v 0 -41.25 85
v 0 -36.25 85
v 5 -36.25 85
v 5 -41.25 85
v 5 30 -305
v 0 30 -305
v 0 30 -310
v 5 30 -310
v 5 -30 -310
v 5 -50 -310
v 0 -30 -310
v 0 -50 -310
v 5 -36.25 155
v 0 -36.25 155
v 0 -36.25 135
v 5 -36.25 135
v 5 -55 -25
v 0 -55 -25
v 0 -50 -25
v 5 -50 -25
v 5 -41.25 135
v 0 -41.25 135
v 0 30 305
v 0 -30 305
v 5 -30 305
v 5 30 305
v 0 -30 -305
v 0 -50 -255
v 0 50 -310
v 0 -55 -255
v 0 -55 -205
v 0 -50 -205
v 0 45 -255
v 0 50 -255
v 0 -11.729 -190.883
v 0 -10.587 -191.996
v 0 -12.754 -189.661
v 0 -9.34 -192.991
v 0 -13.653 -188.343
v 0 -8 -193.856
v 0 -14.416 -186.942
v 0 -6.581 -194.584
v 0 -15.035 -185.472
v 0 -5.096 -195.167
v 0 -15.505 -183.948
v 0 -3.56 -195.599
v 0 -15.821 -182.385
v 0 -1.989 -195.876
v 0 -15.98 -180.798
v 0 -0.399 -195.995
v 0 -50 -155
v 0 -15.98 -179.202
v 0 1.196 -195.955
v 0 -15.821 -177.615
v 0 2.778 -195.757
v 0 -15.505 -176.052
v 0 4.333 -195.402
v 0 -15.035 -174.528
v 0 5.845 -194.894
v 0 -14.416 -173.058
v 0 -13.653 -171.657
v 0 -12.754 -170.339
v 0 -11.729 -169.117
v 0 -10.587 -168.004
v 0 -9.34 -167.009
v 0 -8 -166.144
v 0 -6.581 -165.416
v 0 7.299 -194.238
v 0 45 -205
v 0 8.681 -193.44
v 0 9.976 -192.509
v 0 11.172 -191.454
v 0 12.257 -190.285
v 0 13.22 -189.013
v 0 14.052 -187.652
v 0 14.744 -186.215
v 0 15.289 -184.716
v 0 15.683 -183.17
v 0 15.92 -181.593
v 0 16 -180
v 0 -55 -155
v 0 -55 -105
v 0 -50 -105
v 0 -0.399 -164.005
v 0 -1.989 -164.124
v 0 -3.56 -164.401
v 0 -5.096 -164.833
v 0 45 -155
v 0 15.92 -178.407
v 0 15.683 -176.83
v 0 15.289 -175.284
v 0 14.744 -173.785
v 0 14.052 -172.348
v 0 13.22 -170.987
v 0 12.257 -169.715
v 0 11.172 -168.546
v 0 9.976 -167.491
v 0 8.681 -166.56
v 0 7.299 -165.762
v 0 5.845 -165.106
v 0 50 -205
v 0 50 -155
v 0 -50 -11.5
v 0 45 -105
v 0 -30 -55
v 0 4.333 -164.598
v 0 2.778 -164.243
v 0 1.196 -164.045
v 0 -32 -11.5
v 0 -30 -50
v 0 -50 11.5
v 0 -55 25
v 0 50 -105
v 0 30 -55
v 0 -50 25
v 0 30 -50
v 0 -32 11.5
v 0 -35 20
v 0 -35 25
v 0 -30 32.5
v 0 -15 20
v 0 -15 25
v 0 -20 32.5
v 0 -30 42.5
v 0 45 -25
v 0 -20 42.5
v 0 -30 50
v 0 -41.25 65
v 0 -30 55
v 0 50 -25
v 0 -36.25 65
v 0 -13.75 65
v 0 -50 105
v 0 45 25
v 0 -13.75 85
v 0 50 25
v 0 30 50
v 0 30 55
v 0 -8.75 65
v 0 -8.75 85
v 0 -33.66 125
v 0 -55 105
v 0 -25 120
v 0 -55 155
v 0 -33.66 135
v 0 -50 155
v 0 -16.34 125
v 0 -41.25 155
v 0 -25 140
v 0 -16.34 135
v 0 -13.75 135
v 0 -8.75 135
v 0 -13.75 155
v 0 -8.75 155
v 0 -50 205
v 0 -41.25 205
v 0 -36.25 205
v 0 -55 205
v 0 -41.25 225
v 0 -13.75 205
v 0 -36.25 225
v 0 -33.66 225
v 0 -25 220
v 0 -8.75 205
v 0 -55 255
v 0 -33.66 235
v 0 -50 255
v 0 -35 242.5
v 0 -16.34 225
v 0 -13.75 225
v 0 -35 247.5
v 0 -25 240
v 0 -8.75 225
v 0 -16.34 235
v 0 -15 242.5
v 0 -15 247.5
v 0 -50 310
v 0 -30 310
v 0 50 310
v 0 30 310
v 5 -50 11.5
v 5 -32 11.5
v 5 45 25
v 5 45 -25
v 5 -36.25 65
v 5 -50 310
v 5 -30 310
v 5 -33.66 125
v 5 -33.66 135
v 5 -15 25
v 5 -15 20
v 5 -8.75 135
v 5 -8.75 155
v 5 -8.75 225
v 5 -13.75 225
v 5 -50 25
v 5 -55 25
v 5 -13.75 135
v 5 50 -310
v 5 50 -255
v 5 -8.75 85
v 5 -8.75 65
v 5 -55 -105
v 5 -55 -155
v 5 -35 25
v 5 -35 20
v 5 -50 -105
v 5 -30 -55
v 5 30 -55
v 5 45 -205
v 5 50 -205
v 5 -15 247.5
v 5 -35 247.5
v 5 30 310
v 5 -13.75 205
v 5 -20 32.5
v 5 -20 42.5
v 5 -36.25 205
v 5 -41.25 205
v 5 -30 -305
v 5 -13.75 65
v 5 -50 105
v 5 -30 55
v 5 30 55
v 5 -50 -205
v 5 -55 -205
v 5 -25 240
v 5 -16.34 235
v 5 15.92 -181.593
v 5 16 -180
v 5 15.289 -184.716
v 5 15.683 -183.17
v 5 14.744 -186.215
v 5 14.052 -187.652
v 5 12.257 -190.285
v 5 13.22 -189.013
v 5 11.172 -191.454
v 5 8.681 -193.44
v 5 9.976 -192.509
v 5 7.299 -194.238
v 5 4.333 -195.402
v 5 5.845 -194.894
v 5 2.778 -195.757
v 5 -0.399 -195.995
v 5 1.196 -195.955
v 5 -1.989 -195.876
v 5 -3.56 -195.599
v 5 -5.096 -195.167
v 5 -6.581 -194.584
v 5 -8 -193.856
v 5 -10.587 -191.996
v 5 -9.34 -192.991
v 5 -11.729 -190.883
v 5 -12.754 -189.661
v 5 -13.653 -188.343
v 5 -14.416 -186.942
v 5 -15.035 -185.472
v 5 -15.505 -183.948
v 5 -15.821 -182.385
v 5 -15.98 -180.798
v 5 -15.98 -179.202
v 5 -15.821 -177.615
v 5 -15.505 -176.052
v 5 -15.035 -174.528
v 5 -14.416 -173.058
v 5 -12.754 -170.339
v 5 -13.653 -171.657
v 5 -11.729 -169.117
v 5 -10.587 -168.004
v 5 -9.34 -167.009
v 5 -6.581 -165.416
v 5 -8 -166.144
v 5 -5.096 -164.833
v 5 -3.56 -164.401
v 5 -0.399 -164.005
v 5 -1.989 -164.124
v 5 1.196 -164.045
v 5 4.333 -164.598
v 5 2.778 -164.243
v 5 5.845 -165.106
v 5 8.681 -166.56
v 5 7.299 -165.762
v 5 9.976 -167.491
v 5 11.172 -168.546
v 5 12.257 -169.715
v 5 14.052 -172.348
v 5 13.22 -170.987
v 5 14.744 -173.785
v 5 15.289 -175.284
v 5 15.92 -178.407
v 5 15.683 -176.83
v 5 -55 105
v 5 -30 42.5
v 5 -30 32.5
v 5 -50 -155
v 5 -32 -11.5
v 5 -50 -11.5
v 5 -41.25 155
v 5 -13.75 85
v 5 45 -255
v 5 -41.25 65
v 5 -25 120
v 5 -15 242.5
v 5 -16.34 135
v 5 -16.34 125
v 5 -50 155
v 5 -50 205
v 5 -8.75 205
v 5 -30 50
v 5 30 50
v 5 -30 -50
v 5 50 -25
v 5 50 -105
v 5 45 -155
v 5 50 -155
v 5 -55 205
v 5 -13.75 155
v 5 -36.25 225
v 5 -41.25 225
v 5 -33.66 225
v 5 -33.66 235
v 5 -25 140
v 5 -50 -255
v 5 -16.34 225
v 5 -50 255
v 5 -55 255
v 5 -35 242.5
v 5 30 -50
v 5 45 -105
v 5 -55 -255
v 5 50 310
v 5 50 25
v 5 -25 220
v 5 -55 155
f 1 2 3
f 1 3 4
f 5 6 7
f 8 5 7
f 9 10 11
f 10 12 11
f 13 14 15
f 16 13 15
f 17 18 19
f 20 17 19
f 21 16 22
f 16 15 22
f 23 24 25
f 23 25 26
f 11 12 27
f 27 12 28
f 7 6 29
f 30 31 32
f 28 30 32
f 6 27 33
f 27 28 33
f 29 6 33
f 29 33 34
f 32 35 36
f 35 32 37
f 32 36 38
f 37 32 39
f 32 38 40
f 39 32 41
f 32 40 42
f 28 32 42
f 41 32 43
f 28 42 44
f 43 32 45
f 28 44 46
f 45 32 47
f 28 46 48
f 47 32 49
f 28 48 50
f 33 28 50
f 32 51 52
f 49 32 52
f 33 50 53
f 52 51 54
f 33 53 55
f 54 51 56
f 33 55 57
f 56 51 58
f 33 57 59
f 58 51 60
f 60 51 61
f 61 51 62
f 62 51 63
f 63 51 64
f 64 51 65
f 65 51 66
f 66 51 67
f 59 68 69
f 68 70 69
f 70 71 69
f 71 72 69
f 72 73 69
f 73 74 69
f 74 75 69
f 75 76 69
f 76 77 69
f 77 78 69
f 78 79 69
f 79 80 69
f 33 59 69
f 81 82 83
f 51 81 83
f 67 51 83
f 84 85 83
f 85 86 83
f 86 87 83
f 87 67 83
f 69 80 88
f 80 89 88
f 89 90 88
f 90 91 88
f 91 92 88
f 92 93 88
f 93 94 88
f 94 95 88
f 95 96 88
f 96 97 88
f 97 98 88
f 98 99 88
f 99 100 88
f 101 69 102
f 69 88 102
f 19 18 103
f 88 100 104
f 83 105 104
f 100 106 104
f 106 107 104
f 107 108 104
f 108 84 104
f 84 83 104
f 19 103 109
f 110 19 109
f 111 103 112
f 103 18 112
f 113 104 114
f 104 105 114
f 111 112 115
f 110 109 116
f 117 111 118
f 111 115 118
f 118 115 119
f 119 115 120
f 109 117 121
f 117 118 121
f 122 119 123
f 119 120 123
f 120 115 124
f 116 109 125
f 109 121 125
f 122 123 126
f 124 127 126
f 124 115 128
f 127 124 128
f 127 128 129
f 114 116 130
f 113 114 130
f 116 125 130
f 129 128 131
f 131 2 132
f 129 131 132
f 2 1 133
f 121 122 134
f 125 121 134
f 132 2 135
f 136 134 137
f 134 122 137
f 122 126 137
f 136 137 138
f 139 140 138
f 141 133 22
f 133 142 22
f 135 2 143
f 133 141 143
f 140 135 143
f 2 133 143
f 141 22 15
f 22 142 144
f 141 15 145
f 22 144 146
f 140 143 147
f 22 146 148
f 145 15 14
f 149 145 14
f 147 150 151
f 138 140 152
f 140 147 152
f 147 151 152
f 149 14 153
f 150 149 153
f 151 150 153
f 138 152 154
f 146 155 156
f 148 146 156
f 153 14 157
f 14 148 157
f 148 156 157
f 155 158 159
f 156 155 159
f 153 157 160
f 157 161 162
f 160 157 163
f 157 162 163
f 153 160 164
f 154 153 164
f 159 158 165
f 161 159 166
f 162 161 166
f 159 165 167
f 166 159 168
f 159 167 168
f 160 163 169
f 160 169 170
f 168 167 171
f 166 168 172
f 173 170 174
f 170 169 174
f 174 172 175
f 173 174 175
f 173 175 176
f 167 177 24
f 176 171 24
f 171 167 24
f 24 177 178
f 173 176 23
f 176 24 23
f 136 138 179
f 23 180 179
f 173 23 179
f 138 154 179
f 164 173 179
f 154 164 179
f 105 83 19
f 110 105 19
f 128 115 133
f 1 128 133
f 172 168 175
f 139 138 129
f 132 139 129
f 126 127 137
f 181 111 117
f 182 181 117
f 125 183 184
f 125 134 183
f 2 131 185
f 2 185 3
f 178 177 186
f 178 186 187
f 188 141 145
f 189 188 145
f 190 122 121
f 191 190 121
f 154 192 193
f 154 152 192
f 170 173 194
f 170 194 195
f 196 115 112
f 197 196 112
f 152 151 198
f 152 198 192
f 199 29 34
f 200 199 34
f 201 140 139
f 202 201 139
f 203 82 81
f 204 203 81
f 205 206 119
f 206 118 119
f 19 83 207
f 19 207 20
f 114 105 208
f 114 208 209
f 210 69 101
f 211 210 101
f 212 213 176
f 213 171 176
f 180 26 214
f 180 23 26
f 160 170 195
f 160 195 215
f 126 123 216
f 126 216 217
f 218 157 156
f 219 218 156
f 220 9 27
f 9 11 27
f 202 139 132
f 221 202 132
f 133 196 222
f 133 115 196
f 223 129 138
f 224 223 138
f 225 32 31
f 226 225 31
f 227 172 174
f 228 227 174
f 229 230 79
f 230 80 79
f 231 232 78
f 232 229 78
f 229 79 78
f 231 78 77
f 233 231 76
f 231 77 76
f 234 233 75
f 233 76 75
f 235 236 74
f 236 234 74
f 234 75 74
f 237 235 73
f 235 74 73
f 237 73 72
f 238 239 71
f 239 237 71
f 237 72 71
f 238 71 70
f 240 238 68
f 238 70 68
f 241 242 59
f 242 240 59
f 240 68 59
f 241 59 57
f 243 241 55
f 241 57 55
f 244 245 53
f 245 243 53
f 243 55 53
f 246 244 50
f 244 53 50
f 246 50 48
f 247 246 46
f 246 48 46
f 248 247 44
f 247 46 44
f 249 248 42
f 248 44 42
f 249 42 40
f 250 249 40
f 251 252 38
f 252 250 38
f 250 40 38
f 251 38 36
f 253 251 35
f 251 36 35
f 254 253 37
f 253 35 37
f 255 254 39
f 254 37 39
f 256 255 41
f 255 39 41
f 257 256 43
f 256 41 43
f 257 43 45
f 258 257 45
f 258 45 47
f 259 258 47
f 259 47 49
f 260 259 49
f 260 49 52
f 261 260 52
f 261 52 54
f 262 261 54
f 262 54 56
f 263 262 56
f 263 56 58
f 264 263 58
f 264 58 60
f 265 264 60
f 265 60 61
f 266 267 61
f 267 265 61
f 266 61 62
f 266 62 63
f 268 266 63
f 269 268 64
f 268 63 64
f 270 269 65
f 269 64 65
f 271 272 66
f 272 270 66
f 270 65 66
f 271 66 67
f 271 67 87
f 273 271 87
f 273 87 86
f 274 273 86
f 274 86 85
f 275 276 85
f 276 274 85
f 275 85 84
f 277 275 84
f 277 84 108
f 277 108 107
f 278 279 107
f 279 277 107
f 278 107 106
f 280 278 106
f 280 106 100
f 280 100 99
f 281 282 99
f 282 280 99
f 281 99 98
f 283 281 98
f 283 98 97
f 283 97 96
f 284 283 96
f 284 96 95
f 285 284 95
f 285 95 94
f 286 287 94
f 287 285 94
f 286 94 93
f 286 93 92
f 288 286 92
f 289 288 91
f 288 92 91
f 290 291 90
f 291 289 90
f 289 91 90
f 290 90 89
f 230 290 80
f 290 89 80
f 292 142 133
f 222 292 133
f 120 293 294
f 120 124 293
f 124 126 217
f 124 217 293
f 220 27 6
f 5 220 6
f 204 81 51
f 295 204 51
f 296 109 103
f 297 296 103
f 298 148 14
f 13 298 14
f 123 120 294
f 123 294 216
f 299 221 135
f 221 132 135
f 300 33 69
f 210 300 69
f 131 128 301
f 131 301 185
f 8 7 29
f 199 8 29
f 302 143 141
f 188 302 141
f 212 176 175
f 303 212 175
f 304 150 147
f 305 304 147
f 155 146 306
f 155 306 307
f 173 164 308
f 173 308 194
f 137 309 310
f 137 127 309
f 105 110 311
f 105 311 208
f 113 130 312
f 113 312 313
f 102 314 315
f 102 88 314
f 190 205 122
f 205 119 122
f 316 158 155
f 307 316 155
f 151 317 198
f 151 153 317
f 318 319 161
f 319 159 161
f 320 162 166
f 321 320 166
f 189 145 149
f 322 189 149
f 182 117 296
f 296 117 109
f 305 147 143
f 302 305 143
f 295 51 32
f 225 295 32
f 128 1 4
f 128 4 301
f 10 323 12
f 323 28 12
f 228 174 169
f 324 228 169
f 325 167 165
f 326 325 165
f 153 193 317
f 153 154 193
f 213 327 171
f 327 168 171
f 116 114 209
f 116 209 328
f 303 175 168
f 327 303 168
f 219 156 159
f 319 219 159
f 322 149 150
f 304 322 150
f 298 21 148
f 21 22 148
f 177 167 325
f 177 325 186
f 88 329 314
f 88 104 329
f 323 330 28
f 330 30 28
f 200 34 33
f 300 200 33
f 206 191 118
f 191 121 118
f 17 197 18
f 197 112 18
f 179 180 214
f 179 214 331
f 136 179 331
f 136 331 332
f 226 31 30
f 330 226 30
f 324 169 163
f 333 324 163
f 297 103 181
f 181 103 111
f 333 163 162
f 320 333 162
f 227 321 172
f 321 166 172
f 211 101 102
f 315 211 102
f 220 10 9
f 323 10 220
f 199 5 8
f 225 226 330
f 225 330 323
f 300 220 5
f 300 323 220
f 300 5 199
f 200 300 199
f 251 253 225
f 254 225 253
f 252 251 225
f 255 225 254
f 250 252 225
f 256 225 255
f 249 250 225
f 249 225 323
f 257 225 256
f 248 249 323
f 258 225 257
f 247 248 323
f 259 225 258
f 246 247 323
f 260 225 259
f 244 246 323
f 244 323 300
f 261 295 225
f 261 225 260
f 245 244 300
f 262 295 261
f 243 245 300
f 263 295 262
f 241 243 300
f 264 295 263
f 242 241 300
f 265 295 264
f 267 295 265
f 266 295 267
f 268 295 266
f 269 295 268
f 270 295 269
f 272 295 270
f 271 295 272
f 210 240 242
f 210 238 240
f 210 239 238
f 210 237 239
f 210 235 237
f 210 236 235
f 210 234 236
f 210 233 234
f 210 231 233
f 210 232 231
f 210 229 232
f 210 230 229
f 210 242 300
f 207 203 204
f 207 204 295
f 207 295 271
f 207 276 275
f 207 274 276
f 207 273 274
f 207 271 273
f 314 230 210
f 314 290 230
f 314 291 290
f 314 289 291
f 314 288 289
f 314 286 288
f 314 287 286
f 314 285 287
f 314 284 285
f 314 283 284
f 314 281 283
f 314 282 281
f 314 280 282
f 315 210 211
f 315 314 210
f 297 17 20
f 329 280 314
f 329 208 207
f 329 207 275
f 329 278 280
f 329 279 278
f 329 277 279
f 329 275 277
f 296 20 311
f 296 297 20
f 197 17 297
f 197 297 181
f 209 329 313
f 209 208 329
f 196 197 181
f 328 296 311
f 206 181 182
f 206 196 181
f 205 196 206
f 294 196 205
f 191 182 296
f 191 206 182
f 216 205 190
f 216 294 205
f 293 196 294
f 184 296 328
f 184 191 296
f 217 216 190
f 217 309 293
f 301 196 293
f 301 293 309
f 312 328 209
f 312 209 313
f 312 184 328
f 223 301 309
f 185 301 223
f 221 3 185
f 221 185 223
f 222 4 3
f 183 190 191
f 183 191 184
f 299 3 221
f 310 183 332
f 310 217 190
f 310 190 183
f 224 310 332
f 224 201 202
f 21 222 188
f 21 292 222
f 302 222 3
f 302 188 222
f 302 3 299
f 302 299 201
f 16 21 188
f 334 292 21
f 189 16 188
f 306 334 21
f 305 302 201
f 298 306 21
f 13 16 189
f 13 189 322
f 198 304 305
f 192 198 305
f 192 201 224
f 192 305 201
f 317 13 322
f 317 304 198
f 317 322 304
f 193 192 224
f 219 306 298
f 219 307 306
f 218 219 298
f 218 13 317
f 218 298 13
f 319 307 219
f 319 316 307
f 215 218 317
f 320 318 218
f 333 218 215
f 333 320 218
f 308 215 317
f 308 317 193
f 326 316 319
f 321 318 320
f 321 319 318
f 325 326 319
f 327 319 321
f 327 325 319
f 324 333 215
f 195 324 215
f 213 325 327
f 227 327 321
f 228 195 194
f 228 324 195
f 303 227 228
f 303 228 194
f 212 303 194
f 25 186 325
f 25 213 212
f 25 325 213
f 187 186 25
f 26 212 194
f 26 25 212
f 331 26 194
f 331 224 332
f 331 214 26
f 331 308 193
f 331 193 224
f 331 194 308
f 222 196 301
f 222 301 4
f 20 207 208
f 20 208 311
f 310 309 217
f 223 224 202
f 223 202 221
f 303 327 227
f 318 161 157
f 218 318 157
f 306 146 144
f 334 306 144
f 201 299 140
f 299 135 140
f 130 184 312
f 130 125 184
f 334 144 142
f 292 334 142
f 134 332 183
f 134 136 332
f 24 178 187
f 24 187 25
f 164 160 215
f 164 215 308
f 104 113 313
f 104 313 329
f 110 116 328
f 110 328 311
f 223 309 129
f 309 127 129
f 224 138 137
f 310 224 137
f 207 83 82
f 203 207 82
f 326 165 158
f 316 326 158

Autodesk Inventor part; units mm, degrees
ref_plane "YZ Plane" through (0, 0, 0) normal (1, 0, 0) x (0, 1, 0)
ref_plane "XZ Plane" through (0, 0, 0) normal (0, 1, 0) x (-1, 0, 0)
ref_plane "XY Plane" through (0, 0, 0) normal (0, 0, 1) x (1, 0, 0)
sketch "Sketch1" plane through (0, 0, 0) normal (1, 0, 0) x (0, 1, 0)
  line L0 (-50, 50) -> (50, 50)
  line L1 (50, 50) -> (50, -50)
  line L2 (50, -50) -> (-50, -50)
  line L3 (-50, -50) -> (-50, 50)
  line L4 (-50, 50) -> (50, -50) construction
  line L5 (50, 50) -> (-50, -50) construction
  line L6 (50, 50) -> (-50, 50)
  line L7 (-50, 50) -> (-50, 310)
  line L8 (-50, 310) -> (50, 310)
  line L9 (50, 310) -> (50, 50)
  line L10 (50, -50) -> (-50, -50)
  line L11 (-50, -50) -> (-50, -310)
  line L12 (-50, -310) -> (50, -310)
  line L13 (50, -310) -> (50, -50)
  line L14 (-50, 255) -> (-55, 255)
  line L15 (-55, 255) -> (-55, 205)
  line L16 (-55, 205) -> (-50, 205)
  line L17 (-50, 205) -> (-50, 255)
  line L18 (-50, 155) -> (-55, 155)
  line L19 (-55, 155) -> (-55, 105)
  line L20 (-55, 105) -> (-50, 105)
  line L21 (-50, 105) -> (-50, 155)
  line L22 (-50, 25) -> (-55, 25)
  line L23 (-55, 25) -> (-55, -25)
  line L24 (-55, -25) -> (-50, -25)
  line L25 (-50, -25) -> (-50, 25)
  line L26 (-50, -105) -> (-55, -105)
  line L27 (-55, -105) -> (-55, -155)
  line L28 (-55, -155) -> (-50, -155)
  line L29 (-50, -155) -> (-50, -105)
  line L30 (-50, -205) -> (-55, -205)
  line L31 (-55, -205) -> (-55, -255)
  line L32 (-55, -255) -> (-50, -255)
  line L33 (-50, -255) -> (-50, -205)
  line L34 (50, 310) -> (30, 310)
  line L35 (50, 305) -> (50, 310)
  line L36 (-50, 310) -> (-30, 310)
  line L37 (-50, 305) -> (-50, 310)
  line L38 (30, 50) -> (-30, 50)
  line L39 (-30, 50) -> (-30, 55)
  line L40 (-30, 55) -> (30, 55)
  line L41 (30, 55) -> (30, 50)
  line L42 (30, -50) -> (-36.1124, -50)
  line L43 (50, 0) -> (-50, 0) construction
  line L44 (-30, -50) -> (-30, -55)
  line L45 (-30, -55) -> (30, -55)
  line L46 (30, -55) -> (30, -50)
  line L47 (30, 310) -> (-30, 310)
  line L48 (-30, 310) -> (-30, 305)
  line L49 (-30, 305) -> (30, 305)
  line L50 (30, 305) -> (30, 310)
  line L51 (-30, -310) -> (-30, -305)
  line L52 (-30, -305) -> (30, -305)
  line L53 (30, -305) -> (30, -310)
  line L54 (-50, -180) -> (50, -180) construction
  circle A0 centre (0, -180) radius 16
  line L55 (50, 25) -> (45, 25)
  line L56 (45, 25) -> (45, -25)
  line L57 (45, -25) -> (50, -25)
  line L58 (50, -25) -> (50, 25)
  line L59 (50, -105) -> (45, -105)
  line L60 (45, -105) -> (45, -155)
  line L61 (45, -155) -> (50, -155)
  line L62 (50, -155) -> (50, -105)
  line L63 (50, -255) -> (45, -255)
  line L64 (45, -255) -> (45, -205)
  line L65 (45, -205) -> (50, -205)
  line L66 (-50, 11.5) -> (-32, 11.5)
  line L67 (-32, 11.5) -> (-32, -11.5)
  line L68 (-32, -11.5) -> (-50, -11.5)
  line L69 (-50, -11.5) -> (-50, 11.5)
  line L70 (-33.6603, 235) -> (-25, 240)
  line L71 (-25, 240) -> (-16.3397, 235)
  line L72 (-16.3397, 235) -> (-16.3397, 225)
  line L73 (-16.3397, 225) -> (-25, 220)
  line L74 (-25, 220) -> (-33.6603, 225)
  line L75 (-33.6603, 225) -> (-33.6603, 235)
  line L76 (-33.6603, 135) -> (-25, 140)
  line L77 (-25, 140) -> (-16.3397, 135)
  line L78 (-16.3397, 135) -> (-16.3397, 125)
  line L79 (-16.3397, 125) -> (-25, 120)
  line L80 (-25, 120) -> (-33.6603, 125)
  line L81 (-33.6603, 125) -> (-33.6603, 135)
  line L82 (-8.75, 225) -> (-13.75, 225)
  line L83 (-13.75, 225) -> (-13.75, 205)
  line L84 (-13.75, 205) -> (-8.75, 205)
  line L85 (-8.75, 205) -> (-8.75, 225)
  line L86 (-13.75, 135) -> (-8.75, 135)
  line L87 (-8.75, 135) -> (-8.75, 155)
  line L88 (-8.75, 155) -> (-13.75, 155)
  line L89 (-13.75, 155) -> (-13.75, 135)
  line L90 (-13.75, 85) -> (-8.75, 85)
  line L91 (-8.75, 85) -> (-8.75, 65)
  line L92 (-8.75, 65) -> (-13.75, 65)
  line L93 (-13.75, 65) -> (-13.75, 85)
  line L94 (-25, 314.14) -> (-25, -94.5604) construction
  line L95 (-41.25, 225) -> (-36.25, 225)
  line L96 (-36.25, 225) -> (-36.25, 205)
  line L97 (-36.25, 205) -> (-41.25, 205)
  line L98 (-41.25, 205) -> (-41.25, 225)
  line L99 (-36.25, 135) -> (-41.25, 135)
  line L100 (-41.25, 135) -> (-41.25, 155)
  line L101 (-41.25, 155) -> (-36.25, 155)
  line L102 (-36.25, 155) -> (-36.25, 135)
  line L103 (-36.25, 85) -> (-41.25, 85)
  line L104 (-41.25, 85) -> (-41.25, 65)
  line L105 (-41.25, 65) -> (-36.25, 65)
  line L106 (-36.25, 65) -> (-36.25, 85)
  line L107 (-15, 242.5) -> (-35, 242.5)
  line L108 (-35, 242.5) -> (-35, 247.5)
  line L109 (-35, 247.5) -> (-15, 247.5)
  line L110 (-15, 247.5) -> (-15, 242.5)
  line L111 (-15, 20) -> (-35, 20)
  line L112 (-35, 20) -> (-35, 25)
  line L113 (-35, 25) -> (-15, 25)
  line L114 (-15, 25) -> (-15, 20)
  line L115 (-20, 42.5) -> (-30, 42.5)
  line L116 (-30, 42.5) -> (-30, 32.5)
  line L117 (-30, 32.5) -> (-20, 32.5)
  line L118 (-20, 32.5) -> (-20, 42.5)
  point P0 (0, 0)
  point P1 (-52.5, 155)
  point P2 (-52.5, 205)
  point P3 (-50, 205)
  point P4 (-50, 105)
  point P5 (-50, -155)
  point P6 (-50, -255)
  point P7 (30, -50)
  point P8 (-30, -50)
  point P9 (-30, 50)
  point P10 (30, 50)
  point P11 (30, 307.5)
  point P12 (-30, -310)
  point P13 (30, -310)
  point P14 (30, 310)
  point P15 (-30, 310)
  point P16 (50, -25)
  point P17 (50, -255)
  point P18 (50, -205)
  point P19 (50, -155)
  point P20 (-50, 0)
  point P21 (-50, 11.5)
  point P22 (-50, -11.5)
  point P23 (-25, 230)
  point P24 (-25, 130)
  point P25 (-13.75, 145)
  point P26 (-36.25, 145)
  point P27 (-15, 22.5)
  point P28 (-30, 37.5)
  dimension "d0" = 100
  dimension "d1" = 260
  dimension "d2" = 100
  dimension "d3" = 260
  dimension "d4" = 50
  dimension "d5" = 50
  dimension "d6" = 50
  dimension "d7" = 50
  dimension "d8" = 50
  dimension "d9" = 55
  dimension "d10" = 50
  dimension "d11" = 25
  dimension "d12" = 55
  dimension "d13" = 50
  dimension "d14" = 5
  dimension "d20" = 5
  dimension "d21" = 5
  dimension "d23" = 20
  dimension "d26" = 32
  dimension "d27" = 5
  dimension "d28" = 5
  dimension "d29" = 18
  dimension "d30" = 23
  dimension "d31" = 11.5
  dimension "d32" = 20
  dimension "d34" = 10
  dimension "d35" = 25
  dimension "d37" = 25
  dimension "d38" = 16.3397
  dimension "d39" = 10
  dimension "d40" = 25
  dimension "d41" = 16.3397
  dimension "d42" = 25
  dimension "d43" = 11.25
  dimension "d44" = 20
  dimension "d45" = 0
  dimension "d46" = 5
  dimension "d47" = 20
  dimension "d48" = 5
  dimension "d49" = 11.25
  dimension "d50" = 50
  dimension "d51" = 20
  dimension "d52" = 5
  dimension "d53" = 11.25
  dimension "d54" = 11.25
  dimension "d55" = 20
  dimension "d56" = 10
  dimension "d57" = 5
  dimension "d58" = 12.5
  dimension "d59" = 5
  dimension "d60" = 20
  dimension "d61" = 10
  dimension "d62" = 40
  dimension "d63" = 10
  dimension "d64" = 10
  dimension "d65" = 5
  dimension "d66" = 7.5
extrude "Extrusion1" add sketch "Sketch1" along normal blind 5 contours L7 L8 L48 L49 L50 L9 L0 L41 L40 L39 | L0 L1 L55 L56 L57 L2 L3 L68 L67 L66 | L3 L24 L23 L22 | L20 L19 L18 L7 | L16 L15 L14 L7 | L2 L44 L45 L46 L13 L59 L60 L61 L65 L64 L63 L12 L53 L52 L51 L11 | L11 L28 L27 L26 | L11 L32 L31 L30
equation "\"BendRadius\" = Thickness"
equation "\"BendReliefWidth\" = Thickness"
equation "\"BendReliefDepth\" = 0.5 * Thickness"
equation "\"CornerReliefSize\" = 4 * Thickness"
equation "\"MinimumRemnant\" = 2 * Thickness"
equation "\"TransitionRadius\" = BendRadius"
equation "\"JacobiRadiusSize\" = BendRadius"
equation "\"GapSize\" = Thickness"
equation "\"Thickness\" = 3.048"
properties part number "Lat2" material "Wood (Cherry)"
